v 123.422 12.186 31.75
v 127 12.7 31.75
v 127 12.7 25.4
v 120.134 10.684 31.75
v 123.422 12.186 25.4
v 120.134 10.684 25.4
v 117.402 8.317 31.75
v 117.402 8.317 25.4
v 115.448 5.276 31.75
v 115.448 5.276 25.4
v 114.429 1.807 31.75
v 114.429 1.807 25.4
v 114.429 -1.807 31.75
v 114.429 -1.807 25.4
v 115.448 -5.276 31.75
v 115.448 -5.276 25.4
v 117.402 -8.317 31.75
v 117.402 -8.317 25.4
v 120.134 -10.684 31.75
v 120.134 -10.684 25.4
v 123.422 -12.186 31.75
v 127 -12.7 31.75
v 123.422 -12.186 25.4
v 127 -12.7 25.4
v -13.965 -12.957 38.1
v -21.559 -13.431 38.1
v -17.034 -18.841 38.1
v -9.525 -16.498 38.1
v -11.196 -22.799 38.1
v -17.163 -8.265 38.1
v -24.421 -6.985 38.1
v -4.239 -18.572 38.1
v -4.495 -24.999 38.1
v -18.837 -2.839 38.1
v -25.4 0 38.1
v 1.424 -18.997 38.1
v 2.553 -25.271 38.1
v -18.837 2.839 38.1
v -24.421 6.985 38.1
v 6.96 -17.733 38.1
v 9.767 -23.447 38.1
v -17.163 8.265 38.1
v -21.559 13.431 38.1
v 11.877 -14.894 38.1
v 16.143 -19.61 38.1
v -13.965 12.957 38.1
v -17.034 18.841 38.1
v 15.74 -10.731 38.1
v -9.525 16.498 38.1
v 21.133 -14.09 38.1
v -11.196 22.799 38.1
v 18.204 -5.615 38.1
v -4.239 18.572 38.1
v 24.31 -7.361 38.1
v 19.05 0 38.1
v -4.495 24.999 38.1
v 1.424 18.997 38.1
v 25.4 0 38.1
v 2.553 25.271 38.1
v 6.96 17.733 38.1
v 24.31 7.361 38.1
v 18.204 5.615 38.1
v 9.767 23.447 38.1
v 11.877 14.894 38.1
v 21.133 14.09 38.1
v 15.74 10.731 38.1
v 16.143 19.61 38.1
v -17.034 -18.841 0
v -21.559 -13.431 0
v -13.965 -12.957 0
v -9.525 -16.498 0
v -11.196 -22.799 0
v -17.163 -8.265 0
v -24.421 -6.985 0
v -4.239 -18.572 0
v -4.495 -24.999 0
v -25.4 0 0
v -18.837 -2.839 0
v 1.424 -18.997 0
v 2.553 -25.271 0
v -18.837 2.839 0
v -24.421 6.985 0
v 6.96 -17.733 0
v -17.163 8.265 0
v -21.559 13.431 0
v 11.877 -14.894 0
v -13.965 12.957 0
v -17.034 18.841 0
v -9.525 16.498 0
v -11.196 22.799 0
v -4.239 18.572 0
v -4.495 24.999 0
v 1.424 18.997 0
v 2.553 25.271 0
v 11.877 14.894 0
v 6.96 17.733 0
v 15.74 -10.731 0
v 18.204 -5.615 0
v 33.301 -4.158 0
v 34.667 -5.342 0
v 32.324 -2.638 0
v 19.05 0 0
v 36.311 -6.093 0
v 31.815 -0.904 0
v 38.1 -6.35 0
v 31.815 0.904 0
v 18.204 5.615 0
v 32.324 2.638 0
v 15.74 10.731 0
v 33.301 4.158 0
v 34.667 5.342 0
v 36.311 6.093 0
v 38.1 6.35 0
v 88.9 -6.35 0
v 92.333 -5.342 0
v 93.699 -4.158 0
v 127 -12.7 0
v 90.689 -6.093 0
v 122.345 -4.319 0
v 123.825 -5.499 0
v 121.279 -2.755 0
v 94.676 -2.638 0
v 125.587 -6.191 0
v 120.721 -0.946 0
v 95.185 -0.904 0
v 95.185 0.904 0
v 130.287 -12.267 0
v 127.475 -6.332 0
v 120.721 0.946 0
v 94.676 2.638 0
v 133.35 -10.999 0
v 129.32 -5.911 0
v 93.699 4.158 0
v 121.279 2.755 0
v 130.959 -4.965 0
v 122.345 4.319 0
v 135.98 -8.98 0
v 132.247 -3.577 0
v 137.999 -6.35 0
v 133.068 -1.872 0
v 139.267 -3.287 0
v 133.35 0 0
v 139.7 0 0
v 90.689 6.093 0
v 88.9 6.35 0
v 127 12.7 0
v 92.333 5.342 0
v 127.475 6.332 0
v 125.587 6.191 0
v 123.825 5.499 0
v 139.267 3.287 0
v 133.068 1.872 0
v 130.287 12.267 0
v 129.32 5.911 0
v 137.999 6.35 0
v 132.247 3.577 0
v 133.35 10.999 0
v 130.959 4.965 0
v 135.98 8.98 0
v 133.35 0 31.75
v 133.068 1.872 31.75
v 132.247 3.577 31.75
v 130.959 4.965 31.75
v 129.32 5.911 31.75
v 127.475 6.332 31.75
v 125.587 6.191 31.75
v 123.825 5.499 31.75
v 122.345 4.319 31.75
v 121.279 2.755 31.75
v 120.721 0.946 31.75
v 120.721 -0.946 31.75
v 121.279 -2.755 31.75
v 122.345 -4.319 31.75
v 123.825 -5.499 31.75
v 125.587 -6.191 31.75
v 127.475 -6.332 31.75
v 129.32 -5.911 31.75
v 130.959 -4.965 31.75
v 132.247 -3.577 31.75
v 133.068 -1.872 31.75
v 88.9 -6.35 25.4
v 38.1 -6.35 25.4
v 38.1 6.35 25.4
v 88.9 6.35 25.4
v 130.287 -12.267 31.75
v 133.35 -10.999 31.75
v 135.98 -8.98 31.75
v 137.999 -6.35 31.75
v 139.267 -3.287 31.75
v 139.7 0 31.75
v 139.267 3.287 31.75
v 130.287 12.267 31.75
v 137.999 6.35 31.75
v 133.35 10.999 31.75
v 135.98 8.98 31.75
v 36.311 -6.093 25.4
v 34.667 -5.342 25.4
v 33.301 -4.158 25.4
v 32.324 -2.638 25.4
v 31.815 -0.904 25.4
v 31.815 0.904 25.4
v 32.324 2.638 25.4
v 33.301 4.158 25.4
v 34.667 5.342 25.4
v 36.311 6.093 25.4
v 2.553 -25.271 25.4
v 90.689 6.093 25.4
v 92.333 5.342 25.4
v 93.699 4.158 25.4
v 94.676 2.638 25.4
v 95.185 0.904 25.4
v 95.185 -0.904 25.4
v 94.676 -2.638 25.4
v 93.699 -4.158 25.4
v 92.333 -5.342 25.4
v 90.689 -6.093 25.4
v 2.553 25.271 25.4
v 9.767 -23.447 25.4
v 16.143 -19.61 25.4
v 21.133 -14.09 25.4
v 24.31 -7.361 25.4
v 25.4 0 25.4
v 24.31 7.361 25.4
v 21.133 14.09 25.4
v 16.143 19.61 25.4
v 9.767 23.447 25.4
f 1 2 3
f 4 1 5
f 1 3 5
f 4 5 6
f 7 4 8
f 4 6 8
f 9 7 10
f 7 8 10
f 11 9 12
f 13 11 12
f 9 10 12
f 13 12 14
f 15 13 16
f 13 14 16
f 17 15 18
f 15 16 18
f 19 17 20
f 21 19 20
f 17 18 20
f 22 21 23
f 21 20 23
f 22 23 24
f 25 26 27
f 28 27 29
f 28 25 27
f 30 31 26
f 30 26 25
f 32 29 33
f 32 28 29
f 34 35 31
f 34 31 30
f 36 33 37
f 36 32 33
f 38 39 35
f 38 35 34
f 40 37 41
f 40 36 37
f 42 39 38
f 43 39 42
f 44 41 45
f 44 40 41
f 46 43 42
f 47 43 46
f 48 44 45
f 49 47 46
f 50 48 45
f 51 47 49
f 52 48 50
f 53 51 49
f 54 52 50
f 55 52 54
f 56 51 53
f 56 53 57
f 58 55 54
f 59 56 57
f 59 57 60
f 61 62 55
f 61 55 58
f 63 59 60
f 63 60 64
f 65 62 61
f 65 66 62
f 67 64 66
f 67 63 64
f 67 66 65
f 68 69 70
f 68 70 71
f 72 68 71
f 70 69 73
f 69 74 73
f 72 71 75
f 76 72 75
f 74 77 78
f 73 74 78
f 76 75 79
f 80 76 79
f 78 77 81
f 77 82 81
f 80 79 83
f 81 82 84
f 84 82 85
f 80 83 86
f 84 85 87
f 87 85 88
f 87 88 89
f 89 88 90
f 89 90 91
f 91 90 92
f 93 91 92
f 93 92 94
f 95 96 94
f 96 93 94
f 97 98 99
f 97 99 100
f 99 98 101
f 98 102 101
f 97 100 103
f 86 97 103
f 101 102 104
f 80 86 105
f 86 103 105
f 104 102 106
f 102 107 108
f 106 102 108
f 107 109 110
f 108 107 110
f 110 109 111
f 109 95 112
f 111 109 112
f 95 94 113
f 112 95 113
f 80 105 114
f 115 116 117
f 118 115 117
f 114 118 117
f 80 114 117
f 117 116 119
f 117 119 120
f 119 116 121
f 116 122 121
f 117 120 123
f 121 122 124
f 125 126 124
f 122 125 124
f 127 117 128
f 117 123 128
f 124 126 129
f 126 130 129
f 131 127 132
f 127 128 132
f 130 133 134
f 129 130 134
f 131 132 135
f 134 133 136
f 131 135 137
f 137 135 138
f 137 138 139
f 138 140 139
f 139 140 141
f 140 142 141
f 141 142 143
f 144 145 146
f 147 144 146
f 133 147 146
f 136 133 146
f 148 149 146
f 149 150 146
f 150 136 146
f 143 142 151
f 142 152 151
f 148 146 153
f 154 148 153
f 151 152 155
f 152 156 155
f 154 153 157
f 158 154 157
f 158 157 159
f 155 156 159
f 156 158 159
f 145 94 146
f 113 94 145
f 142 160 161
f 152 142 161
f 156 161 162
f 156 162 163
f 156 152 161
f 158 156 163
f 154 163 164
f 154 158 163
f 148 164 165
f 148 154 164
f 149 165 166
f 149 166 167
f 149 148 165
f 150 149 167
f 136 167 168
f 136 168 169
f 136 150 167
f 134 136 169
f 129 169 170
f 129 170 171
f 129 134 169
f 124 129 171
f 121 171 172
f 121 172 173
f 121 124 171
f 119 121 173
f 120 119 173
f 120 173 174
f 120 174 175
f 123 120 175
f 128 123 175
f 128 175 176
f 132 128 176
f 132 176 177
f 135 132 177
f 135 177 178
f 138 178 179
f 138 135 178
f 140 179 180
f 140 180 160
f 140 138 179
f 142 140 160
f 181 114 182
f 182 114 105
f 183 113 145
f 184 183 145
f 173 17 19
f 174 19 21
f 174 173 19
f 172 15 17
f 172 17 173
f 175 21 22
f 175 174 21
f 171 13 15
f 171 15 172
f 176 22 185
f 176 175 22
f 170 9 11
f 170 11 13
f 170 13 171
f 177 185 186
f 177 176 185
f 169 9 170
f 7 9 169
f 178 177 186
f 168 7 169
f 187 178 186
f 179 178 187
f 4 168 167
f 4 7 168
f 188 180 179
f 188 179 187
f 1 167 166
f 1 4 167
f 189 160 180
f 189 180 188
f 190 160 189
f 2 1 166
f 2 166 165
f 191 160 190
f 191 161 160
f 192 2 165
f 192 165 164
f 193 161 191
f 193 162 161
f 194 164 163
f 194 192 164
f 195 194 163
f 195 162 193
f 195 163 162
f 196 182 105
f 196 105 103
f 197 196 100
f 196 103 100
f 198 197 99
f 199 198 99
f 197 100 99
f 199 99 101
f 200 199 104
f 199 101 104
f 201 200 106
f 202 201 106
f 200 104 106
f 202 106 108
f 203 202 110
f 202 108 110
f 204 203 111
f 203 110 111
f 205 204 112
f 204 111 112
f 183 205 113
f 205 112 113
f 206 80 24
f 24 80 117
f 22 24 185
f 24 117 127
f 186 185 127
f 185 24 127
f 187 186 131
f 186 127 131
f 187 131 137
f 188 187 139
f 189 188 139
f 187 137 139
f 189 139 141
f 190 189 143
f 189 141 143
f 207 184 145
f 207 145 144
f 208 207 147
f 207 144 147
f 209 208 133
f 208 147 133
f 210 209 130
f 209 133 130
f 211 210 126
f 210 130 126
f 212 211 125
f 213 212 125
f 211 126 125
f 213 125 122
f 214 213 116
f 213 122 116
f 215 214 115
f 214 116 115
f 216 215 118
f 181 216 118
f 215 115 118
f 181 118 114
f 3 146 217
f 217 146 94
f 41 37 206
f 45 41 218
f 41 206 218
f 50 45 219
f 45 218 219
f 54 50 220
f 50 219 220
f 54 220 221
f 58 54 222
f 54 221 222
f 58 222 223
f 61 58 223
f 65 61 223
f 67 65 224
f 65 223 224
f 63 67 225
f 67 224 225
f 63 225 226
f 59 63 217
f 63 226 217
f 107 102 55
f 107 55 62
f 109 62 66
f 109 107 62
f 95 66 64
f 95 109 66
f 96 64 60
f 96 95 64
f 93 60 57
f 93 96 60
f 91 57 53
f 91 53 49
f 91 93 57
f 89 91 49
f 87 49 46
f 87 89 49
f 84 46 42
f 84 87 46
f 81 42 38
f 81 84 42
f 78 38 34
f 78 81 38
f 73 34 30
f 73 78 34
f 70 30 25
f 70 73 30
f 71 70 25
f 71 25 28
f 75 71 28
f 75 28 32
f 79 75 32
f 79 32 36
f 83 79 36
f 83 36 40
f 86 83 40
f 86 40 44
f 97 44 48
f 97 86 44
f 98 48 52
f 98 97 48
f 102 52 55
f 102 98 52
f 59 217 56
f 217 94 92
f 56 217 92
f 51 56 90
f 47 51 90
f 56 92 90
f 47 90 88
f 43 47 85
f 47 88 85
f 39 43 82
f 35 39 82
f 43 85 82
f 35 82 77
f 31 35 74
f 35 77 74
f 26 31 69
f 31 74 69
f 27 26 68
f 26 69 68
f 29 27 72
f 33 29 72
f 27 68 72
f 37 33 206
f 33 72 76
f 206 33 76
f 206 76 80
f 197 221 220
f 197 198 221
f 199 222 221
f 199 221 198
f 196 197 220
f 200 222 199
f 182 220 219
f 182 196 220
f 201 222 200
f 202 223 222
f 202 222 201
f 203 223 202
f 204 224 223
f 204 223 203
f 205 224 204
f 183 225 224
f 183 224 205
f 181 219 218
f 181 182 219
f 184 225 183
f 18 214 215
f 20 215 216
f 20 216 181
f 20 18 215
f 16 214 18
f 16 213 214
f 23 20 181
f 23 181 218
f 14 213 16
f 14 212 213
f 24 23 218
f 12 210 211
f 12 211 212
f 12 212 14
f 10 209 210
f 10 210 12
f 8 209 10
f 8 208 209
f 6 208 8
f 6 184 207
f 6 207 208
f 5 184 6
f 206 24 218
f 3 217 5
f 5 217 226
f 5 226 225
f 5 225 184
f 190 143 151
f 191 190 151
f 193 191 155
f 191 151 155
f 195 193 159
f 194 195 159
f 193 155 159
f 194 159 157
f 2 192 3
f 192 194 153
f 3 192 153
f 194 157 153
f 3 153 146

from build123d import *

# Parameters (mm, degrees)
F0_R     = 19.05
F1_DEPTH = 38.1
F0_R_2   = 6.35
F2_DEPTH = 31.75
F3_DEPTH = 25.4


with BuildPart() as f1:
    # F0 (on Top) → F1 (new body)
    with BuildSketch(Plane.XY):
        with BuildLine():
            ThreePointArc((2.552861, -25.271385), (18.841479, -17.034044), (25.4, 0))
            ThreePointArc((25.4, 0), (18.841479, 17.034044), (2.552861, 25.271385))
            ThreePointArc((2.552861, 25.271385), (-25.4, 0), (2.552861, -25.271385))
        make_face()
        Circle(F0_R, mode=Mode.SUBTRACT)
    extrude(amount=F1_DEPTH)



with BuildPart() as f2:
    # F0 (on Top) → F2 (new body)
    with BuildSketch(Plane.XY):
        with BuildLine():
            ThreePointArc((139.7, 0), (135.980256, 8.980256), (127, 12.7))
            ThreePointArc((127, 12.7), (114.3, 0), (127, -12.7))
            ThreePointArc((127, -12.7), (135.980256, -8.980256), (139.7, 0))
        make_face()
        with Locations((127, 0)):
            Circle(F0_R_2, mode=Mode.SUBTRACT)
    extrude(amount=F2_DEPTH)


with BuildPart() as f1_1:
    add(f1.part)

    add(f2.part)  # F3 merges F2
    # F0 (on Top) → F3 (join)
    with BuildSketch(Plane.XY):
        with BuildLine():
            ThreePointArc((2.552861, 25.271385), (18.841479, 17.034044), (25.4, 0))
            ThreePointArc((25.4, 0), (18.841479, -17.034044), (2.552861, -25.271385))
            Line((2.552861, -25.271385), (127, -12.7))
            ThreePointArc((127, -12.7), (114.3, 0), (127, 12.7))
            Line((127, 12.7), (2.552861, 25.271385))
        make_face()
        with BuildLine():
            ThreePointArc((88.9, 6.35), (95.25, 0), (88.9, -6.35))
            Line((88.9, -6.35), (38.1, -6.35))
            ThreePointArc((38.1, -6.35), (31.75, 0), (38.1, 6.35))
            Line((38.1, 6.35), (88.9, 6.35))
        make_face(mode=Mode.SUBTRACT)
    extrude(amount=F3_DEPTH)


solid = f1_1.part
